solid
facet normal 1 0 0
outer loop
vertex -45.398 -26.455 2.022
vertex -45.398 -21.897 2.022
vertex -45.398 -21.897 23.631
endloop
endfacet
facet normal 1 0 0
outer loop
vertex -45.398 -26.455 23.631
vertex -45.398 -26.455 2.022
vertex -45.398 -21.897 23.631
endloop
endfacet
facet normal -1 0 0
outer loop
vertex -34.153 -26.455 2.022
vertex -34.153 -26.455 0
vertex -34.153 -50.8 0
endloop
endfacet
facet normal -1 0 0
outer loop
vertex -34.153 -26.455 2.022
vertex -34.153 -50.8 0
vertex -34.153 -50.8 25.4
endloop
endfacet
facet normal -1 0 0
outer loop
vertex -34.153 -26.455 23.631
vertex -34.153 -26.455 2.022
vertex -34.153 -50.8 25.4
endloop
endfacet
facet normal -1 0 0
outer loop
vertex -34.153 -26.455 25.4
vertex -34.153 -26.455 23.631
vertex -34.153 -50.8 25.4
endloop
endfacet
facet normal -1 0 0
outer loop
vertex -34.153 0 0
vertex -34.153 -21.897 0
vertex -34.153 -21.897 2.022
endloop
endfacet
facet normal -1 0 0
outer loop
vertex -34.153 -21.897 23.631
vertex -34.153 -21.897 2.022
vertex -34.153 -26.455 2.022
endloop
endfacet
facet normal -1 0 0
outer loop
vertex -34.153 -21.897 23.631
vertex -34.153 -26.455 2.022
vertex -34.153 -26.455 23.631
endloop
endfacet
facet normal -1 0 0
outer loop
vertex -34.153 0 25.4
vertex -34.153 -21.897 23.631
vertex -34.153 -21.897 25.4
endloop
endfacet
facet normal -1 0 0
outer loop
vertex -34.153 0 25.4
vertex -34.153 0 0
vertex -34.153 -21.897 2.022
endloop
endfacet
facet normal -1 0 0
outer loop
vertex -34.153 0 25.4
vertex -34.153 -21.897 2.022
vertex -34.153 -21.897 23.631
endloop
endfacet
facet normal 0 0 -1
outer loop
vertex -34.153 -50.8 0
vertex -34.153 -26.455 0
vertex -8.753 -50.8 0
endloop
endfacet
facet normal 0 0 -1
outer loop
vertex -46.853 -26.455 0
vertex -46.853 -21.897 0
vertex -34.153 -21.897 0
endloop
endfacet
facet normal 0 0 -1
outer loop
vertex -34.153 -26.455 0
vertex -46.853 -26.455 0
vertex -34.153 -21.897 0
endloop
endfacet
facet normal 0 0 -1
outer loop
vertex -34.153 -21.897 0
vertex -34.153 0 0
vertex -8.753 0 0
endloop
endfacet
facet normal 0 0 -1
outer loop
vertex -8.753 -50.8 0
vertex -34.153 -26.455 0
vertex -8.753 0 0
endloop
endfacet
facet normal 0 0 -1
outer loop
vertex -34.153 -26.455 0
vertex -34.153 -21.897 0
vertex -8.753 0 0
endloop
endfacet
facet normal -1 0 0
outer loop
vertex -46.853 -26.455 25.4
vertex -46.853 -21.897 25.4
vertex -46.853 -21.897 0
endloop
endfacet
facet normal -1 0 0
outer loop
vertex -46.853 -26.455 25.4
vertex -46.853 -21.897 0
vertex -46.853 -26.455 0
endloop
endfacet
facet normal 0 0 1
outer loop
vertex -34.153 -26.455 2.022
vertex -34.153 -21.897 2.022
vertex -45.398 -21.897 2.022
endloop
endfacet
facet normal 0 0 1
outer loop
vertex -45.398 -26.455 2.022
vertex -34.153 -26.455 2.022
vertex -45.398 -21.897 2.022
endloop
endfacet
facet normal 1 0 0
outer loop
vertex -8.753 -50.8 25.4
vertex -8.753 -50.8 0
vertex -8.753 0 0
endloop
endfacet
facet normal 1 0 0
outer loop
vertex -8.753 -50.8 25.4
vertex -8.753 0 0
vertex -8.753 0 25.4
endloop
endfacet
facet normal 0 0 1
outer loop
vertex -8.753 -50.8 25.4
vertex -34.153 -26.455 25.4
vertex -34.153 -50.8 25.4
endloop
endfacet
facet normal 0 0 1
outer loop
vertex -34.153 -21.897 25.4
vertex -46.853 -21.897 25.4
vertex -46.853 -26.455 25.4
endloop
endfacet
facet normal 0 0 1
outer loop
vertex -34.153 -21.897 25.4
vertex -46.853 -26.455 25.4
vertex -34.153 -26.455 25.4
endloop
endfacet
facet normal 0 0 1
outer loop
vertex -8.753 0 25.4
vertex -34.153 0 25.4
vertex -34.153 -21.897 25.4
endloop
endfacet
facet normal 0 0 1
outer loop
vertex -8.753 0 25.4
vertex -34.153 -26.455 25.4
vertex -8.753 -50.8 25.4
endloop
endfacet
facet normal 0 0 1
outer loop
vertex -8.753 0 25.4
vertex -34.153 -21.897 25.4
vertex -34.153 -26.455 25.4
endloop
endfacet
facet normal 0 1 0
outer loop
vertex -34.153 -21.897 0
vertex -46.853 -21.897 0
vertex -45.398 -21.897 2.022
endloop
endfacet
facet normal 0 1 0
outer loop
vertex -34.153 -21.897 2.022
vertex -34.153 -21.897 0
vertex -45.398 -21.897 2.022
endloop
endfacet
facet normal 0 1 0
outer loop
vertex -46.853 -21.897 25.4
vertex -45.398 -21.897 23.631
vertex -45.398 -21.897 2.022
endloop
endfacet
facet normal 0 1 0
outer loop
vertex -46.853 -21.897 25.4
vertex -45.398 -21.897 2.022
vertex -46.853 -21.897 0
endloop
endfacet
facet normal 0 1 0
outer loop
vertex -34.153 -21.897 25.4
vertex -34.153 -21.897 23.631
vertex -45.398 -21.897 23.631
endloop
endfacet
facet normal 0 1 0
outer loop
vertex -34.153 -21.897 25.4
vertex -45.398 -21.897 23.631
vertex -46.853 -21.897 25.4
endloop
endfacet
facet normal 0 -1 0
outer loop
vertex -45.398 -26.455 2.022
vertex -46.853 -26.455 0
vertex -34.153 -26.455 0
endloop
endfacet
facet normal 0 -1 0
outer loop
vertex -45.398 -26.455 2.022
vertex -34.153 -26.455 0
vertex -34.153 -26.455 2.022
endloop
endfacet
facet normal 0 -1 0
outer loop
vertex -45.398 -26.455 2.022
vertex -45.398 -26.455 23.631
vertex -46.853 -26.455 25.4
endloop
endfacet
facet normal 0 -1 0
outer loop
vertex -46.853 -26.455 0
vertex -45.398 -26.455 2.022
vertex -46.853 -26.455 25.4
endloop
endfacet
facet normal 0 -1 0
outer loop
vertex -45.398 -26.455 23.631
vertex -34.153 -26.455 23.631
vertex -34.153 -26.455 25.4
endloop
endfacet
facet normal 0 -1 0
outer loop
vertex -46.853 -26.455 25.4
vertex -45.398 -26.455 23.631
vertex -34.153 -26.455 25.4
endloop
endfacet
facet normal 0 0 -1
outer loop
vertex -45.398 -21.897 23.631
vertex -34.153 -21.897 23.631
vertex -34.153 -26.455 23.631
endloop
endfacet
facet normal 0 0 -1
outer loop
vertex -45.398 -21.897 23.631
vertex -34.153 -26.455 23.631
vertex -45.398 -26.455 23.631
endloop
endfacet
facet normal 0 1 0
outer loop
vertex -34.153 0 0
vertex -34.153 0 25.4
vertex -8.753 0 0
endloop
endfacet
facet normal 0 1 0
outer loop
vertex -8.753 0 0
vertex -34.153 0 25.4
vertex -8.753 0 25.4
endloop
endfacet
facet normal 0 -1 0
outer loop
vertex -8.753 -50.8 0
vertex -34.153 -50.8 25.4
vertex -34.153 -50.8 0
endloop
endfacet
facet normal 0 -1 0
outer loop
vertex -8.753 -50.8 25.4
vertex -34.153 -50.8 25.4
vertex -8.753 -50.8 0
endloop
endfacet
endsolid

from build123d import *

# Parameters (mm, degrees)
F0_W     = 25.4
F0_H     = 25.4
F1_DEPTH = 50.8
F2_W     = 4.558041
F2_H     = 25.4
F3_DEPTH = 12.7
F4_W     = 11.245678
F4_H     = 21.608493
F5_DEPTH = 25.4


with BuildPart() as f1:
    # F0 (on Front) → F1 (new body)
    with BuildSketch(Plane.XZ):
        with Locations((-21.452703, 12.7)):
            Rectangle(F0_W, F0_H)
    extrude(amount=F1_DEPTH)

    # F2 (on face) → F3 (join)
    with BuildSketch(Plane(origin=(-34.152703, 0, 0), x_dir=(0, -1, 0), z_dir=(-1, 0, 0))):
        with Locations((24.176082, 12.7)):
            Rectangle(F2_W, F2_H)
    extrude(amount=F3_DEPTH)

    # F4 (on face) → F5 (cut)
    with BuildSketch(Plane(origin=(0, -21.897061, 0), x_dir=(-1, 0, 0), z_dir=(0, 1, 0))):
        with Locations((39.775542, 12.82661)):
            Rectangle(F4_W, F4_H)
    extrude(amount=-F5_DEPTH, mode=Mode.SUBTRACT)


solid = f1.part
